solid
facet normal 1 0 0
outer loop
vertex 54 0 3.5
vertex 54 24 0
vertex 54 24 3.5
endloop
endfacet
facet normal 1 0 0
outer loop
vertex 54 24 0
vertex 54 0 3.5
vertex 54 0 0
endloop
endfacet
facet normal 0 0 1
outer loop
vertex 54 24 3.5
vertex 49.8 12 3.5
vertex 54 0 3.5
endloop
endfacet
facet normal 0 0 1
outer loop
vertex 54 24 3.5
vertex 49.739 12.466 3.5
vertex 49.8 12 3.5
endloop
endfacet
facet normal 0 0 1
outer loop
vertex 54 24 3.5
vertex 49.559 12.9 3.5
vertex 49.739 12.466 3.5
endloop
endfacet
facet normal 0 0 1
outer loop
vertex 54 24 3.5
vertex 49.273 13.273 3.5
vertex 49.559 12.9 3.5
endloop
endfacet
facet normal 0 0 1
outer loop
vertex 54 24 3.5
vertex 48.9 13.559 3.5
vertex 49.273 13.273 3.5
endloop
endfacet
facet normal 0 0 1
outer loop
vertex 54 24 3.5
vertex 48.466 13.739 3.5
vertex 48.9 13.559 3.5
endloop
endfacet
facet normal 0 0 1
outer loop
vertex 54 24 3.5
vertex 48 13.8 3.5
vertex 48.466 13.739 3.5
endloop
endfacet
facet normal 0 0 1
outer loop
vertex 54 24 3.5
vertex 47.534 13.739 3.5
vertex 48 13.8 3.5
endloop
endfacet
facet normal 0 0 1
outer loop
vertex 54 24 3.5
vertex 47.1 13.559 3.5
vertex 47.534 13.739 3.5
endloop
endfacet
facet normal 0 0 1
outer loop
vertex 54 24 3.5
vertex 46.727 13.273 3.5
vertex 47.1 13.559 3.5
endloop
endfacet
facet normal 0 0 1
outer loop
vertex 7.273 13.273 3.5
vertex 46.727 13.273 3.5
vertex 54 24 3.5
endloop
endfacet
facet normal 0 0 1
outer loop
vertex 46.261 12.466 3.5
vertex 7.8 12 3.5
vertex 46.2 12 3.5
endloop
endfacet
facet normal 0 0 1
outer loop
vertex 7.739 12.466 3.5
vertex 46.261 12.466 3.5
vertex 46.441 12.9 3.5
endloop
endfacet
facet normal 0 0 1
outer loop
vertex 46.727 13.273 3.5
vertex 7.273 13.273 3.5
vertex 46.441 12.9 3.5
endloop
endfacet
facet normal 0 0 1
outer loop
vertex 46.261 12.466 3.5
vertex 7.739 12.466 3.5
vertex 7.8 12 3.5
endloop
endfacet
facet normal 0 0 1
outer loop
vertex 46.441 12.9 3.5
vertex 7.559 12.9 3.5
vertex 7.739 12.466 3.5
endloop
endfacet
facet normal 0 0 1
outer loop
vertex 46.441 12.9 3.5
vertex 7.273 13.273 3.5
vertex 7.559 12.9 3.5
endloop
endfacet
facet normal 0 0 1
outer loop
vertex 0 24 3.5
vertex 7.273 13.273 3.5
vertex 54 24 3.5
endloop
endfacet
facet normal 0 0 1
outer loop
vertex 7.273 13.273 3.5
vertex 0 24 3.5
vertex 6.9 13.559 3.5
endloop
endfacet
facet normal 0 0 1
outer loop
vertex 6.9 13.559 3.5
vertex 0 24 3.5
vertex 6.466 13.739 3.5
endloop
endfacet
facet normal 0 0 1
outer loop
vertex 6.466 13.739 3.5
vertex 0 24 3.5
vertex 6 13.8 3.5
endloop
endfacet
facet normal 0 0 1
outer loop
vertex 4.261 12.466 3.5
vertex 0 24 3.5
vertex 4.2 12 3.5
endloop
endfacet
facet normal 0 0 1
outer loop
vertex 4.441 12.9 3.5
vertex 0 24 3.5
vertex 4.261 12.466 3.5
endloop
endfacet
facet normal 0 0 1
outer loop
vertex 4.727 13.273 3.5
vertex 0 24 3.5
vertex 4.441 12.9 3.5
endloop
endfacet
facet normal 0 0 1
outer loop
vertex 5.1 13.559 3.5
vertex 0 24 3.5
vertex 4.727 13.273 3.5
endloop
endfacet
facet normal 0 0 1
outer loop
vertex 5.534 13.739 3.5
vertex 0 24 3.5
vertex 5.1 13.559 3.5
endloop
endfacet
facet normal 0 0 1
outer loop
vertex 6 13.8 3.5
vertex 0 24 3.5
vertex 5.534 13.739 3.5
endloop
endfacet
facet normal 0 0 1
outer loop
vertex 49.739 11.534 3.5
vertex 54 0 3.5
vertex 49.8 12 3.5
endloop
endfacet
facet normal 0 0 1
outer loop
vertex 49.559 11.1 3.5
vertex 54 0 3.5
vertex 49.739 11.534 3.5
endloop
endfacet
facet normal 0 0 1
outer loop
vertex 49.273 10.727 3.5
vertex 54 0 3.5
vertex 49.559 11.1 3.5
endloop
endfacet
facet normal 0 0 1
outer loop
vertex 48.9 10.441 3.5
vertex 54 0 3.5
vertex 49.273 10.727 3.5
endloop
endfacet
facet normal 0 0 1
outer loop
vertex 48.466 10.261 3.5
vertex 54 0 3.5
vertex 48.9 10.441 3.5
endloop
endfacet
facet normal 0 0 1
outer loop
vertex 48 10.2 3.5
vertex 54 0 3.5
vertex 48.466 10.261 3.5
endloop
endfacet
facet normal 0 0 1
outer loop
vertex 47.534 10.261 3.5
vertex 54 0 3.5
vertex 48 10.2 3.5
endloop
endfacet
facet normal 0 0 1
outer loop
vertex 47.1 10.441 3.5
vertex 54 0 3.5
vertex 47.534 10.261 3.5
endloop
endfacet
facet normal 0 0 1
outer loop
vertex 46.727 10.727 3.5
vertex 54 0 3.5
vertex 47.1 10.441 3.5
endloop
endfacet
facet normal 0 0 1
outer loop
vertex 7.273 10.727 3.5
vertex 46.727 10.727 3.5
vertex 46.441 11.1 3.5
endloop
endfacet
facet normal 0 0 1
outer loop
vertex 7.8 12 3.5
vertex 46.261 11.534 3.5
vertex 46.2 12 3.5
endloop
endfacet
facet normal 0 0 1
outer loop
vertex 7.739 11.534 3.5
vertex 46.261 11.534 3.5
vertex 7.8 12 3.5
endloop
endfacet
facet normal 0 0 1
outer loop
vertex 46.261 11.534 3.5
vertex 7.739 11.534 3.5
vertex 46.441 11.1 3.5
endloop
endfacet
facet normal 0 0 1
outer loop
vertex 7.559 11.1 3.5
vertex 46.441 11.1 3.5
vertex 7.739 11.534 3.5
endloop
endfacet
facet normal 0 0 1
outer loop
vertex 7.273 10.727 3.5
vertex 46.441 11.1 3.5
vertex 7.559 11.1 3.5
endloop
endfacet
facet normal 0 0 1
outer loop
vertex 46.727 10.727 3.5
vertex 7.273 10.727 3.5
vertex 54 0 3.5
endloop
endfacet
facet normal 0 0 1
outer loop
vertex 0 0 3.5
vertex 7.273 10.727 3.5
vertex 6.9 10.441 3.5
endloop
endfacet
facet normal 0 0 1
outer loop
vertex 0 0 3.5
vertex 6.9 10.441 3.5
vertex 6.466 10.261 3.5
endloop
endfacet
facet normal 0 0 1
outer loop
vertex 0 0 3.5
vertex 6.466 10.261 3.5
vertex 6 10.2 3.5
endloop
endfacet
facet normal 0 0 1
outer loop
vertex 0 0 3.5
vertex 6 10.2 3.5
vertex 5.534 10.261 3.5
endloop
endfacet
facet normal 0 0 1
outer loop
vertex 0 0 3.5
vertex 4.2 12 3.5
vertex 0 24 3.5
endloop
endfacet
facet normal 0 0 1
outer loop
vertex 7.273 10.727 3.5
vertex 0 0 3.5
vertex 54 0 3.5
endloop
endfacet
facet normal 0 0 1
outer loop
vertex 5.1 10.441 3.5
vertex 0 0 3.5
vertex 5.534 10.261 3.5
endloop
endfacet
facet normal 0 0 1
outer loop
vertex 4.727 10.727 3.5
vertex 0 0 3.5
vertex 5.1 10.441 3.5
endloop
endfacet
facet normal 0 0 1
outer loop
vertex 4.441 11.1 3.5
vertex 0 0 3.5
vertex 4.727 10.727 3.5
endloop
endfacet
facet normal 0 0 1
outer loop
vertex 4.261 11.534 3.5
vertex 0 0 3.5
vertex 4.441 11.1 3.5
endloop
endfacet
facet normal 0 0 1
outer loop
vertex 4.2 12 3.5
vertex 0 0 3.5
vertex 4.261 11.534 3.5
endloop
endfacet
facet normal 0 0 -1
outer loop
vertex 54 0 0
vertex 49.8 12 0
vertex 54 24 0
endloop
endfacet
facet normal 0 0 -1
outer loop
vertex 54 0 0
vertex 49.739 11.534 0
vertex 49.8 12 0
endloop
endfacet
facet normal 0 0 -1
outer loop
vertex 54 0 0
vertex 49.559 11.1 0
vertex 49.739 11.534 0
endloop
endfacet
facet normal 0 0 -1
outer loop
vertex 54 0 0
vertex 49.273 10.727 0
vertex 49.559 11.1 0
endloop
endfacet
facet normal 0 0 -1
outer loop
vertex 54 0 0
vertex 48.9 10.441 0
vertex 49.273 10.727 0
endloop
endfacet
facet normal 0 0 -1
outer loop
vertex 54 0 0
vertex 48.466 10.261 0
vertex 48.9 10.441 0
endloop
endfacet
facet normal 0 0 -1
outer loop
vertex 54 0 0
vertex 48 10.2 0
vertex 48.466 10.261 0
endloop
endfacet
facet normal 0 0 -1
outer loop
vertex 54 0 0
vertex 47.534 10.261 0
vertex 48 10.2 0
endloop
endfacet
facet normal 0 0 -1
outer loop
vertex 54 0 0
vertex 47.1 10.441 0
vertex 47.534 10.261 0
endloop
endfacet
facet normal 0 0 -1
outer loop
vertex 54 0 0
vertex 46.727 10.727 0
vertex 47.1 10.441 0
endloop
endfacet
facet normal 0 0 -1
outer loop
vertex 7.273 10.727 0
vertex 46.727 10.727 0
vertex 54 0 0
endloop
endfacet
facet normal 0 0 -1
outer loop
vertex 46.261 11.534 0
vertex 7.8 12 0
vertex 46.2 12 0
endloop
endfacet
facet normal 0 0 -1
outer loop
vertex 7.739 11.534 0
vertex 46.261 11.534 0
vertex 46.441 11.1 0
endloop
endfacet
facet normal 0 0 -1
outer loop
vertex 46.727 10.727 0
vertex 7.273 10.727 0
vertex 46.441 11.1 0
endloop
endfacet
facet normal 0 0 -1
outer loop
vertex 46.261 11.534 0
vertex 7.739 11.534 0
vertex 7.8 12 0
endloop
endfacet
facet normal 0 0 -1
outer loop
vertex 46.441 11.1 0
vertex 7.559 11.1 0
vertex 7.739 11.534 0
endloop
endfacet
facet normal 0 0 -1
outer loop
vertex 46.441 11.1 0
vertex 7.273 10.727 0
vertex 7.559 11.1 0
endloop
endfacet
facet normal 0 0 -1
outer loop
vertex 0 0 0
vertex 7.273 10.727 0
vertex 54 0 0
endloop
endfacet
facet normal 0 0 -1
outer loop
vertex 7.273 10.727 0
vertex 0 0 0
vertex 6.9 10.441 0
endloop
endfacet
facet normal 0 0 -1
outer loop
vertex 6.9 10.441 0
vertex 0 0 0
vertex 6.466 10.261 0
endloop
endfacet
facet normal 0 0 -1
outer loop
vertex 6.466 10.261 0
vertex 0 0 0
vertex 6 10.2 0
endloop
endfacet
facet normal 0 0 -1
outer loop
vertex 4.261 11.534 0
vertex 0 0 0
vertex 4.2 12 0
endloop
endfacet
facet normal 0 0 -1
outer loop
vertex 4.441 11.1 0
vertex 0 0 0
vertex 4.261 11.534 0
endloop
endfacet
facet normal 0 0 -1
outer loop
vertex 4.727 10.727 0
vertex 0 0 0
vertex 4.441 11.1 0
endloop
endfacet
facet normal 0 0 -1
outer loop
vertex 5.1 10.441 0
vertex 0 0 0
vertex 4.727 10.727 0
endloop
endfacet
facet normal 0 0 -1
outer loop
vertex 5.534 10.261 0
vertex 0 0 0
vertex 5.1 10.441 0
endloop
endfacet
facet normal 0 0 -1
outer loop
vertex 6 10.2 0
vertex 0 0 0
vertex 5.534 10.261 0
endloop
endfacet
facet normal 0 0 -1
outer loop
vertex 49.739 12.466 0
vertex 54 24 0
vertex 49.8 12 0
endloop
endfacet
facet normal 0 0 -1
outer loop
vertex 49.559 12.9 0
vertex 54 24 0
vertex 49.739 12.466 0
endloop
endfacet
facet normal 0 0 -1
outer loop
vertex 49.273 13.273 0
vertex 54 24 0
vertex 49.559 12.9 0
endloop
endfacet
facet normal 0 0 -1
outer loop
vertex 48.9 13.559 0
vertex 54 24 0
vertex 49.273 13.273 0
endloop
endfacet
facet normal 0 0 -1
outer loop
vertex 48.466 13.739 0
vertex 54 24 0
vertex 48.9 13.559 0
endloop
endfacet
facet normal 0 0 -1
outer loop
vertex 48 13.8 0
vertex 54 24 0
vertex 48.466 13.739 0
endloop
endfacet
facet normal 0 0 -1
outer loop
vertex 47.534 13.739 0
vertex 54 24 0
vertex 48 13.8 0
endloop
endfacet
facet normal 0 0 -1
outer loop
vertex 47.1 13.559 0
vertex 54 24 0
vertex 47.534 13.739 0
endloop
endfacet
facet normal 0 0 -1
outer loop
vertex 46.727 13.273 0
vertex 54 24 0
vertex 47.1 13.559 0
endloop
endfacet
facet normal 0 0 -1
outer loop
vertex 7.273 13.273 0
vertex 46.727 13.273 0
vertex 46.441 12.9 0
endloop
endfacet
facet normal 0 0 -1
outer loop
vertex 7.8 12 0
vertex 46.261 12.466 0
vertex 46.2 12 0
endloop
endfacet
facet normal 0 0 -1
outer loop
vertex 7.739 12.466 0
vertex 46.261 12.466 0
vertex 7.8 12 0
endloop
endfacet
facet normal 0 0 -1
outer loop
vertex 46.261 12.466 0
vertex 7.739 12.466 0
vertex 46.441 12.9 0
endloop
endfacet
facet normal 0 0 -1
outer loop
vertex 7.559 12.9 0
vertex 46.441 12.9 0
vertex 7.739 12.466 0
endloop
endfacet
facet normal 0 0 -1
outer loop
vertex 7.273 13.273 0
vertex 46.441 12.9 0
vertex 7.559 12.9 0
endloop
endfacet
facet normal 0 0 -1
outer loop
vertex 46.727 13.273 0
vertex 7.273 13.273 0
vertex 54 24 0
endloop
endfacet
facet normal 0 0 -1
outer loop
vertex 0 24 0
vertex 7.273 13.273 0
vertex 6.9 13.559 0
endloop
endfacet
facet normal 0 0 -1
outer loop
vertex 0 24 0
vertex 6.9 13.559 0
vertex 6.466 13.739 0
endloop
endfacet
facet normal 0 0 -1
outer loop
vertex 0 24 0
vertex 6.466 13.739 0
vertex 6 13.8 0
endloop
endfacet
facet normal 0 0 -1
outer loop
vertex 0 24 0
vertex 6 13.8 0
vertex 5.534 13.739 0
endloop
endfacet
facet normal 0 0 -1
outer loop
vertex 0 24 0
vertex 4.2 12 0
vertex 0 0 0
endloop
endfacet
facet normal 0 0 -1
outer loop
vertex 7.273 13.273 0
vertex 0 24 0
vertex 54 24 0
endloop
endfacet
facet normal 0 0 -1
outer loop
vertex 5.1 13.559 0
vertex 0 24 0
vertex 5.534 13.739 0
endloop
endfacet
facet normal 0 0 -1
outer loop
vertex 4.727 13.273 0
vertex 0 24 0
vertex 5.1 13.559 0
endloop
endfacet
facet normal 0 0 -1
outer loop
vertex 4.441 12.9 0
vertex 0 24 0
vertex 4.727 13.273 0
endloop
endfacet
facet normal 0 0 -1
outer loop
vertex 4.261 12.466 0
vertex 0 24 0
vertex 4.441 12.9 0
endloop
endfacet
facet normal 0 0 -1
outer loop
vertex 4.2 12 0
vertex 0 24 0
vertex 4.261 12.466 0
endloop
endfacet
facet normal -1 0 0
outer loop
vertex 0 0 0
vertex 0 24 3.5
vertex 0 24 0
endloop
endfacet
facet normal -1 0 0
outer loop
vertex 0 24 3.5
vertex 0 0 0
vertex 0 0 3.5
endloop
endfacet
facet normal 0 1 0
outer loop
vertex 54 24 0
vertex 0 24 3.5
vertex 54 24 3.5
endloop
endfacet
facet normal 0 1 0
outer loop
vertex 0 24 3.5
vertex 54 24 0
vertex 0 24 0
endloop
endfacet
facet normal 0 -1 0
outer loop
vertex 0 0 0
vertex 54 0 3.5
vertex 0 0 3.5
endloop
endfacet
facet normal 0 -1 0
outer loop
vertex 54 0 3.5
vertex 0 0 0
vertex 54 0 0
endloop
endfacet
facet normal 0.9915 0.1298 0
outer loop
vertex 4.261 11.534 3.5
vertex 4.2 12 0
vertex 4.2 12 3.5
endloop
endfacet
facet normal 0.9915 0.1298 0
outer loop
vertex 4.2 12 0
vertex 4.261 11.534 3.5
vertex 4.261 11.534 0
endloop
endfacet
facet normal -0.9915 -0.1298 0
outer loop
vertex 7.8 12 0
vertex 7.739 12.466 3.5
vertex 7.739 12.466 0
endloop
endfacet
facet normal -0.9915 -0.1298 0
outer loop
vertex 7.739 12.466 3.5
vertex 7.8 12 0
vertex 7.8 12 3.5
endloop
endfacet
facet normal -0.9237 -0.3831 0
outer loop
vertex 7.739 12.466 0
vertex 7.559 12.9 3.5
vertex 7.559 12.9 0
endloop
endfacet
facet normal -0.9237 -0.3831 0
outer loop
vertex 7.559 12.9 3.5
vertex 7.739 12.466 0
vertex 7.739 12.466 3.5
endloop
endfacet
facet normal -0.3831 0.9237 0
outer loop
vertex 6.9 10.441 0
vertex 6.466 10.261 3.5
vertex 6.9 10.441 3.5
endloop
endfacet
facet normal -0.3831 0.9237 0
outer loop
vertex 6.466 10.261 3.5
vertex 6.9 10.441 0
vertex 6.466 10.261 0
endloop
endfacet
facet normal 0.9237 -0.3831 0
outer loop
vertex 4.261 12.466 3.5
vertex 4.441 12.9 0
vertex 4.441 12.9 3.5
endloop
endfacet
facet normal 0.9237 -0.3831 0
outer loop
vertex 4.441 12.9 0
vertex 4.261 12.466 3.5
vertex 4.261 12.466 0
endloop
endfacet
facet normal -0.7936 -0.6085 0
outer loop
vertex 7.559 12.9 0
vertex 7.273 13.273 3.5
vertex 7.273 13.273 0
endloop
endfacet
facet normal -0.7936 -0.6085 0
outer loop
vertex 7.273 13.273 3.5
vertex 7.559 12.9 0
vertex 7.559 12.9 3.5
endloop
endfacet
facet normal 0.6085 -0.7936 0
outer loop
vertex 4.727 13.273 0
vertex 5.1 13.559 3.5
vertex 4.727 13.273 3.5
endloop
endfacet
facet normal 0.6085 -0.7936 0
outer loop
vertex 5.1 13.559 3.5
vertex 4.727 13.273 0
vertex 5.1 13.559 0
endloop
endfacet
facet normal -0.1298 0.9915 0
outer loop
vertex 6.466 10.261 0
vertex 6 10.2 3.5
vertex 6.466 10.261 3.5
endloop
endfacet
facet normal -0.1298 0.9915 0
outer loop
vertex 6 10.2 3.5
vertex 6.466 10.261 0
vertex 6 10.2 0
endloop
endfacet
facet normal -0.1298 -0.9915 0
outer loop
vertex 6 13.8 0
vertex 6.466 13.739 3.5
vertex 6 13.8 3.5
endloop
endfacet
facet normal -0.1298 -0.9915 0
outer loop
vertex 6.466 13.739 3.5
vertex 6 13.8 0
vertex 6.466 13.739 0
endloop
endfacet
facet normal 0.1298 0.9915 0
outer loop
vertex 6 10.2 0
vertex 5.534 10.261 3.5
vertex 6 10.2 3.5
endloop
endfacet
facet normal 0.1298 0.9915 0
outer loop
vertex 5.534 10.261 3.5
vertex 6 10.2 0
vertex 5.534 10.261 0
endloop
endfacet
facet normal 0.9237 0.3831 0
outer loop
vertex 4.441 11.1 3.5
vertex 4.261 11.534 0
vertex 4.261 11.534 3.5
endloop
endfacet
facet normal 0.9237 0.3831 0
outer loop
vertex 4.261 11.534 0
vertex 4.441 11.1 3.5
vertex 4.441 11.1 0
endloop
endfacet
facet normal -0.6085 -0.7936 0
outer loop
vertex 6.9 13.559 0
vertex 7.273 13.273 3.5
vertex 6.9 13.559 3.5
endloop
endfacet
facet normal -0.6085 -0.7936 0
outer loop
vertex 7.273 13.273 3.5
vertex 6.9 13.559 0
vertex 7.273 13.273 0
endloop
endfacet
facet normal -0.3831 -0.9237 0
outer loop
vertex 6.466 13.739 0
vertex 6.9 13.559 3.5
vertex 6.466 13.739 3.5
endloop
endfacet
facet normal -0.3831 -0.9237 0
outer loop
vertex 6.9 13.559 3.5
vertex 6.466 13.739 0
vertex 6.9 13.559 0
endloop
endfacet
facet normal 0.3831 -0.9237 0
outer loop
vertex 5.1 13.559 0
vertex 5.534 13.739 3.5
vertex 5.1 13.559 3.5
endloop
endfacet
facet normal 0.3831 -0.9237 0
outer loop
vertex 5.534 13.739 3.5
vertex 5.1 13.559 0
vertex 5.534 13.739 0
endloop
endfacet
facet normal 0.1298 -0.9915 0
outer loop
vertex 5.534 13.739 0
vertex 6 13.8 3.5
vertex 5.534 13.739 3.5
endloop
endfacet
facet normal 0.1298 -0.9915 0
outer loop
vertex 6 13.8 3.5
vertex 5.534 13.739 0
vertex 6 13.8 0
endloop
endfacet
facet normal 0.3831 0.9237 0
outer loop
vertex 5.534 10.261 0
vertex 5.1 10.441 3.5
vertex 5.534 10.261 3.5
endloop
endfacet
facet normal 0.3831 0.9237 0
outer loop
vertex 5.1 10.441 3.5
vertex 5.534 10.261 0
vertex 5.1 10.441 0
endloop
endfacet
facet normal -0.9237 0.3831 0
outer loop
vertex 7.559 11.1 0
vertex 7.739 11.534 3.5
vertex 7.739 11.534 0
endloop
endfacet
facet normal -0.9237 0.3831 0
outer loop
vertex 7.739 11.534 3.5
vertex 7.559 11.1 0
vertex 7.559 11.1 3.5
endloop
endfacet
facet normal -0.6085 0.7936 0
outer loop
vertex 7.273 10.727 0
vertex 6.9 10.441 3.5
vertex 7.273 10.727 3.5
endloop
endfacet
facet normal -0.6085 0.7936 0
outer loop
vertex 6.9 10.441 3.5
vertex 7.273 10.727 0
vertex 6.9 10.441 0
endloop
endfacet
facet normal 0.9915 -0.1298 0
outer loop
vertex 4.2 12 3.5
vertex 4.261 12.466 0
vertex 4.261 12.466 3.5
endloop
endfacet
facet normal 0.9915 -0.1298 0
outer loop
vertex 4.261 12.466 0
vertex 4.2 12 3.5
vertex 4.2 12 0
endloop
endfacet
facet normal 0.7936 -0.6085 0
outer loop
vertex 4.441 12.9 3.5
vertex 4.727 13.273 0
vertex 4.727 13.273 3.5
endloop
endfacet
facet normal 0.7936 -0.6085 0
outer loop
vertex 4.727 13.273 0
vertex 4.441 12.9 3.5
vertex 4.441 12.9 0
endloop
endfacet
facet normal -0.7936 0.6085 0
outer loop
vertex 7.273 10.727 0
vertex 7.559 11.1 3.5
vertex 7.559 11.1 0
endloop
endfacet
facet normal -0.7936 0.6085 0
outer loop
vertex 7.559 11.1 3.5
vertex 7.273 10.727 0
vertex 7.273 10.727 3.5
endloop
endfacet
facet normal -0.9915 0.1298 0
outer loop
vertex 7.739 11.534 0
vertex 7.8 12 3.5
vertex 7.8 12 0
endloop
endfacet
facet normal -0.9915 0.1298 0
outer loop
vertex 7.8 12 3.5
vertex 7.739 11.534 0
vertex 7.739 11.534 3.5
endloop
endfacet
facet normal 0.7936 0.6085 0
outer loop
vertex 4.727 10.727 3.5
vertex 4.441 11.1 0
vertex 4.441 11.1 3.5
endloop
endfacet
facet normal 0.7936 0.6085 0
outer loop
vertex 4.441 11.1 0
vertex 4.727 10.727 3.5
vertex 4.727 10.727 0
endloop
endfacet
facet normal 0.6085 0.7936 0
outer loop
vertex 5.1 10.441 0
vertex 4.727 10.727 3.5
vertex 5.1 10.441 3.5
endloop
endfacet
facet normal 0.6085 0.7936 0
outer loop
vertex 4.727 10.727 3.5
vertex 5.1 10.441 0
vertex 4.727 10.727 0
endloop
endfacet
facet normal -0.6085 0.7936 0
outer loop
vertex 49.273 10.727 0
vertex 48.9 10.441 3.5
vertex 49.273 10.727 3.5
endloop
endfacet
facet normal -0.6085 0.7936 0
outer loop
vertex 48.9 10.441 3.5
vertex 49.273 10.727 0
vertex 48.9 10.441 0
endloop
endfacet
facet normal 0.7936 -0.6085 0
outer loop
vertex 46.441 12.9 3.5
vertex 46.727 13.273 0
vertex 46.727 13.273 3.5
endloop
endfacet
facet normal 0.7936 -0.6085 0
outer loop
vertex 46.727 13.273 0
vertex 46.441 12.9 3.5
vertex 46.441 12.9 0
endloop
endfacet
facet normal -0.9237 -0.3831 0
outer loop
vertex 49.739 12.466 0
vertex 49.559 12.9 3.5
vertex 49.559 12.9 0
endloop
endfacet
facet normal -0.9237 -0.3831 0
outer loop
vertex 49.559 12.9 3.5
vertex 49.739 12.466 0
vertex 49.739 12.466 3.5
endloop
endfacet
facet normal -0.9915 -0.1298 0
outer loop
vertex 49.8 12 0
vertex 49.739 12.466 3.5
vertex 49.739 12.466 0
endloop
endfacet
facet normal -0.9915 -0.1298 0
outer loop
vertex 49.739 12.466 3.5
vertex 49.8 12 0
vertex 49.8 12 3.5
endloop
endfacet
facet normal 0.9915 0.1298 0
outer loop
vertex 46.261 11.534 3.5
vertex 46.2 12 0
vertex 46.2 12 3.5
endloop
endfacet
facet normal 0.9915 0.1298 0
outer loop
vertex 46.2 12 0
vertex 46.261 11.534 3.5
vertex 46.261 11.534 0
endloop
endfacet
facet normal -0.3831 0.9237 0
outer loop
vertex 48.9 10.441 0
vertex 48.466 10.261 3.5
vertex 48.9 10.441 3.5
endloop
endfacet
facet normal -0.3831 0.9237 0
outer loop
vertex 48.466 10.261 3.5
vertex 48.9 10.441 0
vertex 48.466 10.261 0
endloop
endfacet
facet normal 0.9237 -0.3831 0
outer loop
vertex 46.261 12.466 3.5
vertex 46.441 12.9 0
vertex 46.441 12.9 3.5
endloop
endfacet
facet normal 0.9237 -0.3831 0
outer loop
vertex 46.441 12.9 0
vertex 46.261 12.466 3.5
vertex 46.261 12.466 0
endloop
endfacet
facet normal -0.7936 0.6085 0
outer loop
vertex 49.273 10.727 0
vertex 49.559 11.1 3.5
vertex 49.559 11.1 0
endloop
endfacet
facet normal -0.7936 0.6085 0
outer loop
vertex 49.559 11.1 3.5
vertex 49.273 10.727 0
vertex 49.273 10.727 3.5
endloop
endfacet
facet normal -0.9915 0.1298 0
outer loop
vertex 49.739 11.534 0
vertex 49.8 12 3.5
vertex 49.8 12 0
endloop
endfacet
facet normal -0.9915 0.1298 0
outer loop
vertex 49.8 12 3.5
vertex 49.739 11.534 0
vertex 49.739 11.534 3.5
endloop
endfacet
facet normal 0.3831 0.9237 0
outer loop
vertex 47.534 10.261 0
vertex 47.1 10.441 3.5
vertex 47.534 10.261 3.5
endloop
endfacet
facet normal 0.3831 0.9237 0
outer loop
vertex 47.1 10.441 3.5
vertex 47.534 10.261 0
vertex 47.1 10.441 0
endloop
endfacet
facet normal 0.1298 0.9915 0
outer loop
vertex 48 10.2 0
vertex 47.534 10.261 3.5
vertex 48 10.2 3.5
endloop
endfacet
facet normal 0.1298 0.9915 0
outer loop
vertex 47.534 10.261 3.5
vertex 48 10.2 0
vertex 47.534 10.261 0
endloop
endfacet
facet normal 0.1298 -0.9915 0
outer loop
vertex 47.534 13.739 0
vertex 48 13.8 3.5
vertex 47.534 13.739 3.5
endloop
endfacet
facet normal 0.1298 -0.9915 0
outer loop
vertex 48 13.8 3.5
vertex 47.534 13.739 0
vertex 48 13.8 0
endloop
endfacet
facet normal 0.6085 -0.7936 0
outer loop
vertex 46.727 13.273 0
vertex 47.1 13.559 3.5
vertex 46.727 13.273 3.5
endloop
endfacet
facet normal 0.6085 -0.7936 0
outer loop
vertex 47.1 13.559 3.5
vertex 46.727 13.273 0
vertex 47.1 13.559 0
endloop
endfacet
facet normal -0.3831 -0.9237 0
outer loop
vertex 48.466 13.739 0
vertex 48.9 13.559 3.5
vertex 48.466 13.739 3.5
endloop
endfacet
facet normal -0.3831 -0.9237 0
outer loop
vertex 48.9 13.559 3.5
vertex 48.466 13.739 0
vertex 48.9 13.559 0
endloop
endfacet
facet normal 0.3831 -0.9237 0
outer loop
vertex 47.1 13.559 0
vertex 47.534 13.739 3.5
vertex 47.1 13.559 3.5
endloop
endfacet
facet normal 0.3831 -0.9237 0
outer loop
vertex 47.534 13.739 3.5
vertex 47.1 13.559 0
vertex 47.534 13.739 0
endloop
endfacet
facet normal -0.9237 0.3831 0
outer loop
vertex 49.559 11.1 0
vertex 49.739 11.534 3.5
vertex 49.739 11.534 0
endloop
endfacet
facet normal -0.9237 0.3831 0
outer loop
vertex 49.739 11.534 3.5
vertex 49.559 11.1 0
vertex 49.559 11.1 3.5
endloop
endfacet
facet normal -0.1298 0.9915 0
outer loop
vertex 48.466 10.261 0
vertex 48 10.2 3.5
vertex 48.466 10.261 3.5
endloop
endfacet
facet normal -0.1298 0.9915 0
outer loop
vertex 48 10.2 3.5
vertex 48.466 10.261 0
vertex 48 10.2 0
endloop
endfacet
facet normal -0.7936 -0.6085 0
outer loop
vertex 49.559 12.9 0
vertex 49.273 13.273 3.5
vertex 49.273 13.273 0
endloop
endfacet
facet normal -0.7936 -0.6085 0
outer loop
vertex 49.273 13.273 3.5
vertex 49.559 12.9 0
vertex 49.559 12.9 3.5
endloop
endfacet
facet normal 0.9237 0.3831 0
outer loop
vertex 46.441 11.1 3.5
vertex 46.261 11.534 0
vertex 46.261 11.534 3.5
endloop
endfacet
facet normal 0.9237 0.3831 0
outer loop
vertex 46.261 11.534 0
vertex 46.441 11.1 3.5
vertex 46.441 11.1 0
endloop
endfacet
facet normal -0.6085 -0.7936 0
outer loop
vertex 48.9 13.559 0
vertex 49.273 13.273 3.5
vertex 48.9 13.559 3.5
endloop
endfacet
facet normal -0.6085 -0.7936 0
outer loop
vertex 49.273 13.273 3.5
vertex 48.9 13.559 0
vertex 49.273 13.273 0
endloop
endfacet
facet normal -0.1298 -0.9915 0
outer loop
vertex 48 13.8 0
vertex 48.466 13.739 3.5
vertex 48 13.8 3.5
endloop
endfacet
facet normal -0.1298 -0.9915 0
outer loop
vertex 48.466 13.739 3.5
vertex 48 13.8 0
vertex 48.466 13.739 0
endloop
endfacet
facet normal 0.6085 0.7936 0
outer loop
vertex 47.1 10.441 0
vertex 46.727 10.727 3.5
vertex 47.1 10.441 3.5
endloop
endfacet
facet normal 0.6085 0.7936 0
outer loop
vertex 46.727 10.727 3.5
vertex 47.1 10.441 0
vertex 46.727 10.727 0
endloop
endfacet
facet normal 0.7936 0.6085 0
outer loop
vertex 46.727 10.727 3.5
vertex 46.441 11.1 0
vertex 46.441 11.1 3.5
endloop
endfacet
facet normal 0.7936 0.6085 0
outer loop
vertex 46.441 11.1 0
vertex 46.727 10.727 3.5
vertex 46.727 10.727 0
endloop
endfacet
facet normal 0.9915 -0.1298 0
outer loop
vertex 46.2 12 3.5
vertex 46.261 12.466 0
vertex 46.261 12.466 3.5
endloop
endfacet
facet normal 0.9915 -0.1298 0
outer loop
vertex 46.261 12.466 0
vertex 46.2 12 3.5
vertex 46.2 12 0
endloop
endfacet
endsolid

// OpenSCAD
module ds3218_bracket(t=3.5){
  difference(){
    cube([54,24,t]);
    translate([6,12,-0.1]) cylinder(h=t+0.2,r=1.8,$fn=24);
    translate([48,12,-0.1]) cylinder(h=t+0.2,r=1.8,$fn=24);
  }
}
ds3218_bracket();
